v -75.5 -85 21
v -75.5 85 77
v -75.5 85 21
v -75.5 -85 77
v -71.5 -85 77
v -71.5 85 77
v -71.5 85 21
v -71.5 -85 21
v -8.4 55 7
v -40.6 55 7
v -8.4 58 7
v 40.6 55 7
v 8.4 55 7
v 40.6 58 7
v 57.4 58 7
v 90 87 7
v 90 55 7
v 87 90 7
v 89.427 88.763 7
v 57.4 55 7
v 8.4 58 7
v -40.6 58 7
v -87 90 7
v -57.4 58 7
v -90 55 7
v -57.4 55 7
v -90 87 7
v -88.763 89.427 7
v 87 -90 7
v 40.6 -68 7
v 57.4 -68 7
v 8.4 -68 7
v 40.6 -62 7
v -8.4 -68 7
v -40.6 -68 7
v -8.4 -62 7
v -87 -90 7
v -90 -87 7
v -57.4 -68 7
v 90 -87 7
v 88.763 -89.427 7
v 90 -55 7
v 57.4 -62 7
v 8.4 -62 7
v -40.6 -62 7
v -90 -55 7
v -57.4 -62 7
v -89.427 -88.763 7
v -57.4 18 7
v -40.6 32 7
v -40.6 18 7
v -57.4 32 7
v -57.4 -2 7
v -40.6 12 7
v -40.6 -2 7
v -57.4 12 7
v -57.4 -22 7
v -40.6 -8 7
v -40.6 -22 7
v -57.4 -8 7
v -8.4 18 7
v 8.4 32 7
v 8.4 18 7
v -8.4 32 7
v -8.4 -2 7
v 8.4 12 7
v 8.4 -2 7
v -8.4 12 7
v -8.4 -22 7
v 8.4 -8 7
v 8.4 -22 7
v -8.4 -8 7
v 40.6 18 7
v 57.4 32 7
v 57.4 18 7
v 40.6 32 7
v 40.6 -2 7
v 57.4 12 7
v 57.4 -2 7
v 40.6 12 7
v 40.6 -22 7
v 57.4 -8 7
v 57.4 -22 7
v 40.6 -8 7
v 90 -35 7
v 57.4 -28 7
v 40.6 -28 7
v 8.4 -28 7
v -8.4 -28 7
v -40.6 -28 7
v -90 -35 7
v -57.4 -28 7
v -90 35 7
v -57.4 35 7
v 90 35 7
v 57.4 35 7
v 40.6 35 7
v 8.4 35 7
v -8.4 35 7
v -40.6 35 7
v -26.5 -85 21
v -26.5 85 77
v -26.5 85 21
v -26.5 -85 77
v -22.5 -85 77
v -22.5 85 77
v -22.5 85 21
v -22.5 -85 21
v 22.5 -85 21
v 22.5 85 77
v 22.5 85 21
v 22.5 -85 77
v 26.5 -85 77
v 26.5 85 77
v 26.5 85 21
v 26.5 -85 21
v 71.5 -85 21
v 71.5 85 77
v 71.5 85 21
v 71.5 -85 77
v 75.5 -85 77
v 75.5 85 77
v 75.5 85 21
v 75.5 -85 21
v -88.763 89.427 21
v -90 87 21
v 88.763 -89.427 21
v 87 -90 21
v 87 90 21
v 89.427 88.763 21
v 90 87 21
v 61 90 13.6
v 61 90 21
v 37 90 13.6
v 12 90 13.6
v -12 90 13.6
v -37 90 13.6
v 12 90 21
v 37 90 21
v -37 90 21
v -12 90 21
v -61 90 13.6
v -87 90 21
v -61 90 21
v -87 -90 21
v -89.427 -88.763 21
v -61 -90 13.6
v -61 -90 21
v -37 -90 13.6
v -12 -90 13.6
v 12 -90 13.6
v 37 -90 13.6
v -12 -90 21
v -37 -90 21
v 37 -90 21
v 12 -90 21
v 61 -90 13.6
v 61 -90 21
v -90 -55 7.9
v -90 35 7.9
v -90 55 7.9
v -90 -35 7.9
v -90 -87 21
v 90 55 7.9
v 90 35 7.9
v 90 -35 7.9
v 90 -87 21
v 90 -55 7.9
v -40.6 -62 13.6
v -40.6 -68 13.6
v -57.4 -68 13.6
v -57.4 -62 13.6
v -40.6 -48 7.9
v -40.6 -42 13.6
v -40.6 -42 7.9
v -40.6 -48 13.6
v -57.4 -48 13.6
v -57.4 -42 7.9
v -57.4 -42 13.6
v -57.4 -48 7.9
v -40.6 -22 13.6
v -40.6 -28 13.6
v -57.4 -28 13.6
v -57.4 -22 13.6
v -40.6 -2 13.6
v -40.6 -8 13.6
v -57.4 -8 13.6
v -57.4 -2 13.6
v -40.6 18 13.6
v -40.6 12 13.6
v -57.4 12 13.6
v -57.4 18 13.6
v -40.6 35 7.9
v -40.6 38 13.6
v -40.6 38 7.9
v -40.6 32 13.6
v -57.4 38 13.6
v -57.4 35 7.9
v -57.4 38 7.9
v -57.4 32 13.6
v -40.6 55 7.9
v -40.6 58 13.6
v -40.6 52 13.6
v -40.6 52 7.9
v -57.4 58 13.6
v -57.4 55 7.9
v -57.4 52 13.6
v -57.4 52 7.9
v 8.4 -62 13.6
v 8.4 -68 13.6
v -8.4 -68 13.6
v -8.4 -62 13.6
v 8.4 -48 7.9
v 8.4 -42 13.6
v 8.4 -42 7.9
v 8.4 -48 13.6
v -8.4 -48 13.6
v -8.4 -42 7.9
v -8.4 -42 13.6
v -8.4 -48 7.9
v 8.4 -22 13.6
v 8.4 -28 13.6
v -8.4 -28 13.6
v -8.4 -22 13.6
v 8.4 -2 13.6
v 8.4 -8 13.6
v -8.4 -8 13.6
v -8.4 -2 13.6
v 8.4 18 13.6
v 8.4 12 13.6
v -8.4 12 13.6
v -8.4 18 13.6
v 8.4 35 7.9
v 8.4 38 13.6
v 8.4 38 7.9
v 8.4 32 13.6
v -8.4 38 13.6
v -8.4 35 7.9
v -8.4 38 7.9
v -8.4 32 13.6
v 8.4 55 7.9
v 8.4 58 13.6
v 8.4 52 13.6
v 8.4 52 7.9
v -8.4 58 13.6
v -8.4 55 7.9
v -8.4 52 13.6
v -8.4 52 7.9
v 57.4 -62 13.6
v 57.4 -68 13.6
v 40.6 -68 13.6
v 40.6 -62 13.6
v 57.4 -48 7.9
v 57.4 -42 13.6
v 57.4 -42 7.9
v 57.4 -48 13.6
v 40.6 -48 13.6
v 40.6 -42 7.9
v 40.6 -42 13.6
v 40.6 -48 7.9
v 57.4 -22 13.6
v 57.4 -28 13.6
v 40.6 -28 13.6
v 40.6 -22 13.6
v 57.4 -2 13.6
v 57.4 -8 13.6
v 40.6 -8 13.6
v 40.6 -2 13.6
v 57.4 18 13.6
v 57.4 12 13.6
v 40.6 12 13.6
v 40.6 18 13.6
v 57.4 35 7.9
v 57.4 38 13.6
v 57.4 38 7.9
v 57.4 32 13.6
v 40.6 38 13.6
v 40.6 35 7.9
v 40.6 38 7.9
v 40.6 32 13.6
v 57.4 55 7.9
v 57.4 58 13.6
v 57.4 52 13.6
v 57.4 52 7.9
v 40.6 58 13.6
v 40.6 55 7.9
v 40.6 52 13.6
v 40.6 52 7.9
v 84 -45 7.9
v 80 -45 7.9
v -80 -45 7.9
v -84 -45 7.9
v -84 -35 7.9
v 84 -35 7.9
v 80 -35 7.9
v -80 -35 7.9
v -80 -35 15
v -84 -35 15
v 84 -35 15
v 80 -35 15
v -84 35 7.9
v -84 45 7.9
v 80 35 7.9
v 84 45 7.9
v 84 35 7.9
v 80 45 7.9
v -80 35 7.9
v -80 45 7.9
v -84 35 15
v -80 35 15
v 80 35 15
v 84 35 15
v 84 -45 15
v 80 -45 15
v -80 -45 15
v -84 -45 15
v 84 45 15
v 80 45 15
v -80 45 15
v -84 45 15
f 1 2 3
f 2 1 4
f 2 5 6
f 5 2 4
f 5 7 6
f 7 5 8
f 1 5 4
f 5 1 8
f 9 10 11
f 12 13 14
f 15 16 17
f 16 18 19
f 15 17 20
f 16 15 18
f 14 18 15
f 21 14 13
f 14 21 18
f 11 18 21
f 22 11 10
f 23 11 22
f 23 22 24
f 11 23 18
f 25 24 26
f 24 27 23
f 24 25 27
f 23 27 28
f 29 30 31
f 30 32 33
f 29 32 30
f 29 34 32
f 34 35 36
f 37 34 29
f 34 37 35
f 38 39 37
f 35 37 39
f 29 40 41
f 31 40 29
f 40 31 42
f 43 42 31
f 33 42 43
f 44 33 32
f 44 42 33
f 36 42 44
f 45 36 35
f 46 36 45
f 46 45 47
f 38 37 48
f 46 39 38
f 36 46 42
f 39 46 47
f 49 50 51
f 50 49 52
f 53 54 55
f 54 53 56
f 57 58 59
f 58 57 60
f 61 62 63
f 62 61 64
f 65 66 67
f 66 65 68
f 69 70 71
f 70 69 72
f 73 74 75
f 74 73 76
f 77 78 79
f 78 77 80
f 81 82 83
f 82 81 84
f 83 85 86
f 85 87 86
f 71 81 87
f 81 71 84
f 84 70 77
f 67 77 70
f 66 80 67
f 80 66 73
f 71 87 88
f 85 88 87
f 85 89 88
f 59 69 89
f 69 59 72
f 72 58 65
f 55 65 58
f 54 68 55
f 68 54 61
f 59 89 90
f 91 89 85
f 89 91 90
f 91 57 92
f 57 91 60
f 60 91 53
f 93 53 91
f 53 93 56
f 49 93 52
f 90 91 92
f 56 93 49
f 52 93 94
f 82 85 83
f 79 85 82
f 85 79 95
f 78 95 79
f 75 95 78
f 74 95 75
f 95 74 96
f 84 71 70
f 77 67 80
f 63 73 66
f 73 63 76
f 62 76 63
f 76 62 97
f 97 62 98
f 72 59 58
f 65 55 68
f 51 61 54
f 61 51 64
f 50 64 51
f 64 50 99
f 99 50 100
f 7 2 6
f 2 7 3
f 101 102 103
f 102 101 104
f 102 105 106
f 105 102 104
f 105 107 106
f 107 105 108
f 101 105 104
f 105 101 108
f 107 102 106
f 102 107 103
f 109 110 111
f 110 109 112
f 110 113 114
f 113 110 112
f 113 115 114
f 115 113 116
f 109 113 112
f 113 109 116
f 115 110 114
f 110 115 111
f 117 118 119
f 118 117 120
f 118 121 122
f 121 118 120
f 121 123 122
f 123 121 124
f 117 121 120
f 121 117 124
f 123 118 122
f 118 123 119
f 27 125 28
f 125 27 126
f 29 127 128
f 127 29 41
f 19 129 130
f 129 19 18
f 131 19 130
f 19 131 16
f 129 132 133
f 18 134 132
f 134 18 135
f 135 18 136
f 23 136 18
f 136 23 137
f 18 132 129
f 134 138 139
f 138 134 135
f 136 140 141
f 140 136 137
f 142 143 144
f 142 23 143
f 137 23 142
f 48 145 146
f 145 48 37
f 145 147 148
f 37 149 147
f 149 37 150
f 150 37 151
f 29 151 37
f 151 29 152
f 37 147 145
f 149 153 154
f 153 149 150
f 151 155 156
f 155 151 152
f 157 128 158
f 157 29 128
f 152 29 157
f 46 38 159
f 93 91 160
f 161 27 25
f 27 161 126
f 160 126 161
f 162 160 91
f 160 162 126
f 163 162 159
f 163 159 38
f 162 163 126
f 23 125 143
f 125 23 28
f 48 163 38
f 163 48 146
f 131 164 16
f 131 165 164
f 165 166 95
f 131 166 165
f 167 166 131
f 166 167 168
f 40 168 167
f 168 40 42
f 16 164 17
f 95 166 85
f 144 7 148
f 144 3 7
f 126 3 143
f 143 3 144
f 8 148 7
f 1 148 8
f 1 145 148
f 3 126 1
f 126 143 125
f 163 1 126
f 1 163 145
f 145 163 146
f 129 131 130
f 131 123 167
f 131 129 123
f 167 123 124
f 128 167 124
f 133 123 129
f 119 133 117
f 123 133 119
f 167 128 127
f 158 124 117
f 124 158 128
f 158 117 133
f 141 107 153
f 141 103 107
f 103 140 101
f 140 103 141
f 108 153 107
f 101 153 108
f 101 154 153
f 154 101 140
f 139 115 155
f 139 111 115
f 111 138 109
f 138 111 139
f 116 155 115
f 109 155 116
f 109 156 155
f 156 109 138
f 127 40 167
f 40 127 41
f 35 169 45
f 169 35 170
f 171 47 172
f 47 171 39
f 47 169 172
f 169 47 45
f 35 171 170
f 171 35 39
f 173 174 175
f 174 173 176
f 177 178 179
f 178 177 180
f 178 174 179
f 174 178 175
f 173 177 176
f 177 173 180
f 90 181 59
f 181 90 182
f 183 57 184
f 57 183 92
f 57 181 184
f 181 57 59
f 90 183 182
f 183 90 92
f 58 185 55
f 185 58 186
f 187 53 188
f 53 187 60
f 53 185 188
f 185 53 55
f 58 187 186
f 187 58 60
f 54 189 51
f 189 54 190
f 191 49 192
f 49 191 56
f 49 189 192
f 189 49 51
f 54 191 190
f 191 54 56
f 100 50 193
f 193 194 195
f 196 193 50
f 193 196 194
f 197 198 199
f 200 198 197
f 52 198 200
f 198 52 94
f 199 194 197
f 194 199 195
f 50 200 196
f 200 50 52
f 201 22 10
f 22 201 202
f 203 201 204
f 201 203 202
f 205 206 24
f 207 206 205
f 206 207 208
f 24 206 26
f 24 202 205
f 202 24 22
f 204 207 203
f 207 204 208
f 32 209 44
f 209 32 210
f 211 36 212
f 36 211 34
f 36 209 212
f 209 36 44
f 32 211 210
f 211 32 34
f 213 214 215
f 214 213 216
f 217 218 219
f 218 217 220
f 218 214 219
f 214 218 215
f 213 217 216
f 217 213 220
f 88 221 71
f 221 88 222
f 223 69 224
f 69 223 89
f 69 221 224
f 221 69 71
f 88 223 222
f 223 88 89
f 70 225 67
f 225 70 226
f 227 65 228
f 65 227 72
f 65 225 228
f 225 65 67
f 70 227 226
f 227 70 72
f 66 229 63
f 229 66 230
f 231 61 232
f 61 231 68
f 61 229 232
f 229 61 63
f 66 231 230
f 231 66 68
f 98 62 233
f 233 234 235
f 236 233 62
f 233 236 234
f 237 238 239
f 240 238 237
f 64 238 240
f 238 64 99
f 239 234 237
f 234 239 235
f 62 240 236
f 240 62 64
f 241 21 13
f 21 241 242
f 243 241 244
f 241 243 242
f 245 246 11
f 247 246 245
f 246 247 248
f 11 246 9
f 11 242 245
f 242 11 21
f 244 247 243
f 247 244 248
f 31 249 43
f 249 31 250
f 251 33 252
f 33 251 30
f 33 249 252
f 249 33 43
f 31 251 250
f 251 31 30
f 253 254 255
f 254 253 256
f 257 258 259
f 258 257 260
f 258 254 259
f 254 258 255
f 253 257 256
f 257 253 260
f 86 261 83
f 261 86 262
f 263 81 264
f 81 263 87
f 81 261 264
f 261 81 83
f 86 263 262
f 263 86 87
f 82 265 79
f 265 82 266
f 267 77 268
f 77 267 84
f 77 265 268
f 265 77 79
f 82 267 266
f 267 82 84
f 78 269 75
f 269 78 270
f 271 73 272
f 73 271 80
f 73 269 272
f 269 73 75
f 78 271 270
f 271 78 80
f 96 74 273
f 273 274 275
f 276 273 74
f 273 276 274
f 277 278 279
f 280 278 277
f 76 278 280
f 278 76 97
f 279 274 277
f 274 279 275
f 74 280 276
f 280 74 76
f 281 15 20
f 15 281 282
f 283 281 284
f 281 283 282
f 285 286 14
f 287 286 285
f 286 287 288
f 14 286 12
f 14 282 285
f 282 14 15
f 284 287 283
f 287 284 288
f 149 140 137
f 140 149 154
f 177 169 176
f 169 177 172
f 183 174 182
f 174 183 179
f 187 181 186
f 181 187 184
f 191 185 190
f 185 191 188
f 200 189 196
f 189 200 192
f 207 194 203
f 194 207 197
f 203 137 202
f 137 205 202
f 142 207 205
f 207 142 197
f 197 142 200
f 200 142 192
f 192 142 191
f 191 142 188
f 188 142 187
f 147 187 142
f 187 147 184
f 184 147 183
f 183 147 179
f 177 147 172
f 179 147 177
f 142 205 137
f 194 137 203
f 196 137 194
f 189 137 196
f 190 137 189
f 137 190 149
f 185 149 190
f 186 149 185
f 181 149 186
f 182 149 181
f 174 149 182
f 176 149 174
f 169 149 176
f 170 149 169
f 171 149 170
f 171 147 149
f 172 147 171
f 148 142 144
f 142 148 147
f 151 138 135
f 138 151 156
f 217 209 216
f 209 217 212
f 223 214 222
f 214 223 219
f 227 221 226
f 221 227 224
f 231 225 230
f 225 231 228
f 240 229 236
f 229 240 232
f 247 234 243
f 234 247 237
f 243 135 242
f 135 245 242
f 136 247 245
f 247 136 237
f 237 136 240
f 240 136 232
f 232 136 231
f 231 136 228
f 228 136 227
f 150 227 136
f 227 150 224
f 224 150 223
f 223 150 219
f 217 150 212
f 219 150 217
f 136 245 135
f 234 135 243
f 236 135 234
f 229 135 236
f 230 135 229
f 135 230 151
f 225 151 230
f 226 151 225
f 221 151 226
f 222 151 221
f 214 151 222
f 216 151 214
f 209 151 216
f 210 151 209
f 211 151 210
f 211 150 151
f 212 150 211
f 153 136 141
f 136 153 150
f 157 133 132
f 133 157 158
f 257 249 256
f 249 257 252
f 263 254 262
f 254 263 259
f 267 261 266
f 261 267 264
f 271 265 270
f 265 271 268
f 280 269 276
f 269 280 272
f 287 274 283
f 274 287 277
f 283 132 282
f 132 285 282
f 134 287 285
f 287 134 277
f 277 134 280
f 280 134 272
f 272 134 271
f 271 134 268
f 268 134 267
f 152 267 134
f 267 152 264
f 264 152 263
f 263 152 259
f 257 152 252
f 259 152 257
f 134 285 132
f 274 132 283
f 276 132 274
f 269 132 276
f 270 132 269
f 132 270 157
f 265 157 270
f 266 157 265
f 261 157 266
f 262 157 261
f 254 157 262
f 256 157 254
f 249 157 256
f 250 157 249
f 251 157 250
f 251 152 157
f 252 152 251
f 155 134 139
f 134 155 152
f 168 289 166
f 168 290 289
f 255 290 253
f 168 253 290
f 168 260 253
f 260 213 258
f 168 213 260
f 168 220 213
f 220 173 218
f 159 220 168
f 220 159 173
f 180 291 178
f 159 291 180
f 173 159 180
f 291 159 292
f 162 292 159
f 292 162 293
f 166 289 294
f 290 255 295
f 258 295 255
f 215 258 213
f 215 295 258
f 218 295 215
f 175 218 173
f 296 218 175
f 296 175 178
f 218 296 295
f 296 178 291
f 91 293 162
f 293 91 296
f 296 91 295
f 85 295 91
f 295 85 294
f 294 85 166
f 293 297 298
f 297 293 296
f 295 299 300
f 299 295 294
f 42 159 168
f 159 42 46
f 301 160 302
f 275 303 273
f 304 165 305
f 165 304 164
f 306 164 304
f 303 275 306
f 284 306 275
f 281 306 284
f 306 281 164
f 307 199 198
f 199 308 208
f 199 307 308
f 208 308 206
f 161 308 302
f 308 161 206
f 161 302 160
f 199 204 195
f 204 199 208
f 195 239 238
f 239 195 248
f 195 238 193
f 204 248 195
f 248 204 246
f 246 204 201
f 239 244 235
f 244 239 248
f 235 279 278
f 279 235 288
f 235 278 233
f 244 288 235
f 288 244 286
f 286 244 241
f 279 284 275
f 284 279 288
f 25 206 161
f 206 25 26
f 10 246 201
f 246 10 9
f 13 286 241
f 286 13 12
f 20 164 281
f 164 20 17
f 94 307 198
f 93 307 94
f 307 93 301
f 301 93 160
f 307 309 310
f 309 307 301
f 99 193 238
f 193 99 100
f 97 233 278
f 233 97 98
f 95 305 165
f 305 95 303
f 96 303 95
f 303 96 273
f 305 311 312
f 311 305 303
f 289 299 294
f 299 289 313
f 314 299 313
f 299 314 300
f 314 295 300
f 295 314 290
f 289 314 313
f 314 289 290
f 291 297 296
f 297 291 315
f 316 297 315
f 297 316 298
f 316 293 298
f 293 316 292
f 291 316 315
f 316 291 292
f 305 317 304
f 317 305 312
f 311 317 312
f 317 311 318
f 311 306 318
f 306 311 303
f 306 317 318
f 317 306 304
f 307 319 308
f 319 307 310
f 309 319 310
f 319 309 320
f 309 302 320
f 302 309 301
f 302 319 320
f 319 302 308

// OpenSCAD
// ===================================================================
// TRIPLE LAPTOP VERTICAL SERVER STAND (PARAMETRIC OPENSCAD PROTOTYPE)
// Model 1: "Toaster" Style Desk Cluster Stand
// Optimized for FDM 3D Printing (PETG / PLA+ recommended)
// ===================================================================

/* [Laptop Dimensions] */
slot_count = 3;                  // Number of laptop bays
slot_width = 24;                 // Thickness of each laptop in mm (adjust for your models)
laptop_height_support = 70;      // Height of vertical support fins in mm
stand_depth = 180;               // Front-to-back depth of stand in mm

/* [Chassis Parameters] */
wall_thick = 4.0;                // Structural wall thickness in mm
air_gap = 25.0;                  // Cooling chimney gap between laptops in mm
base_height = 14.0;              // Base platform elevation for airflow & cables
fillet_r = 3.0;                  // Corner rounding

/* [Vents & Cable Routing] */
vent_slot_width = 6.0;           // Width of ventilation cutouts
cable_channel_h = 8.0;           // Height of bottom cable channels
cable_channel_w = 20.0;          // Width of bottom cable channels

// Calculated Dimensions
total_width = (slot_count * slot_width) + ((slot_count + 1) * air_gap) + (2 * wall_thick);

module rounded_rect(w, d, h, r) {
    linear_extrude(height = h) {
        offset(r = r) {
            square([w - 2*r, d - 2*r], center = true);
        }
    }
}

module vertical_stand() {
    difference() {
        union() {
            // Main solid base block
            translate([0, 0, base_height / 2])
                rounded_rect(total_width, stand_depth, base_height, fillet_r);

            // Vertical Support Fins / Dividers
            for (i = [0 : slot_count]) {
                offset_x = -total_width/2 + wall_thick + air_gap/2 + i * (slot_width + air_gap);
                translate([offset_x, 0, (laptop_height_support + base_height) / 2]) {
                    // Tapered fin for easy laptop insertion
                    hull() {
                        cube([wall_thick, stand_depth - 10, laptop_height_support], center = true);
                        translate([0, 0, laptop_height_support/2 - 5])
                            cube([wall_thick * 0.6, stand_depth - 30, 2], center = true);
                    }
                }
            }
        }

        // Subtractive Laptop Slots
        for (i = [0 : slot_count - 1]) {
            slot_center_x = -total_width/2 + wall_thick + air_gap + slot_width/2 + i * (slot_width + air_gap);

            // Laptop slot opening
            translate([slot_center_x, 0, base_height + laptop_height_support/2 + 0.1])
                cube([slot_width, stand_depth + 2, laptop_height_support + 1], center = true);

            // Chimney Air Vents at bottom of each slot
            for (v = [-stand_depth/2 + 25 : 20 : stand_depth/2 - 25]) {
                translate([slot_center_x, v, base_height / 2])
                    cube([slot_width * 0.7, vent_slot_width, base_height + 4], center = true);
            }
        }

        // Transverse Cable Routing Tunnels (Underneath)
        translate([0, 0, cable_channel_h / 2 - 0.1]) {
            translate([0, -stand_depth * 0.25, 0])
                cube([total_width + 4, cable_channel_w, cable_channel_h], center = true);
            translate([0, stand_depth * 0.25, 0])
                cube([total_width + 4, cable_channel_w, cable_channel_h], center = true);
        }

        // Zip-tie Anchor Holes
        for (i = [-1, 1]) {
            translate([total_width/2 - 8, i * 40, base_height/2])
                cube([4, 10, base_height + 2], center = true);
            translate([-total_width/2 + 8, i * 40, base_height/2])
                cube([4, 10, base_height + 2], center = true);
        }
    }
}

// Render the 3D model
vertical_stand();
